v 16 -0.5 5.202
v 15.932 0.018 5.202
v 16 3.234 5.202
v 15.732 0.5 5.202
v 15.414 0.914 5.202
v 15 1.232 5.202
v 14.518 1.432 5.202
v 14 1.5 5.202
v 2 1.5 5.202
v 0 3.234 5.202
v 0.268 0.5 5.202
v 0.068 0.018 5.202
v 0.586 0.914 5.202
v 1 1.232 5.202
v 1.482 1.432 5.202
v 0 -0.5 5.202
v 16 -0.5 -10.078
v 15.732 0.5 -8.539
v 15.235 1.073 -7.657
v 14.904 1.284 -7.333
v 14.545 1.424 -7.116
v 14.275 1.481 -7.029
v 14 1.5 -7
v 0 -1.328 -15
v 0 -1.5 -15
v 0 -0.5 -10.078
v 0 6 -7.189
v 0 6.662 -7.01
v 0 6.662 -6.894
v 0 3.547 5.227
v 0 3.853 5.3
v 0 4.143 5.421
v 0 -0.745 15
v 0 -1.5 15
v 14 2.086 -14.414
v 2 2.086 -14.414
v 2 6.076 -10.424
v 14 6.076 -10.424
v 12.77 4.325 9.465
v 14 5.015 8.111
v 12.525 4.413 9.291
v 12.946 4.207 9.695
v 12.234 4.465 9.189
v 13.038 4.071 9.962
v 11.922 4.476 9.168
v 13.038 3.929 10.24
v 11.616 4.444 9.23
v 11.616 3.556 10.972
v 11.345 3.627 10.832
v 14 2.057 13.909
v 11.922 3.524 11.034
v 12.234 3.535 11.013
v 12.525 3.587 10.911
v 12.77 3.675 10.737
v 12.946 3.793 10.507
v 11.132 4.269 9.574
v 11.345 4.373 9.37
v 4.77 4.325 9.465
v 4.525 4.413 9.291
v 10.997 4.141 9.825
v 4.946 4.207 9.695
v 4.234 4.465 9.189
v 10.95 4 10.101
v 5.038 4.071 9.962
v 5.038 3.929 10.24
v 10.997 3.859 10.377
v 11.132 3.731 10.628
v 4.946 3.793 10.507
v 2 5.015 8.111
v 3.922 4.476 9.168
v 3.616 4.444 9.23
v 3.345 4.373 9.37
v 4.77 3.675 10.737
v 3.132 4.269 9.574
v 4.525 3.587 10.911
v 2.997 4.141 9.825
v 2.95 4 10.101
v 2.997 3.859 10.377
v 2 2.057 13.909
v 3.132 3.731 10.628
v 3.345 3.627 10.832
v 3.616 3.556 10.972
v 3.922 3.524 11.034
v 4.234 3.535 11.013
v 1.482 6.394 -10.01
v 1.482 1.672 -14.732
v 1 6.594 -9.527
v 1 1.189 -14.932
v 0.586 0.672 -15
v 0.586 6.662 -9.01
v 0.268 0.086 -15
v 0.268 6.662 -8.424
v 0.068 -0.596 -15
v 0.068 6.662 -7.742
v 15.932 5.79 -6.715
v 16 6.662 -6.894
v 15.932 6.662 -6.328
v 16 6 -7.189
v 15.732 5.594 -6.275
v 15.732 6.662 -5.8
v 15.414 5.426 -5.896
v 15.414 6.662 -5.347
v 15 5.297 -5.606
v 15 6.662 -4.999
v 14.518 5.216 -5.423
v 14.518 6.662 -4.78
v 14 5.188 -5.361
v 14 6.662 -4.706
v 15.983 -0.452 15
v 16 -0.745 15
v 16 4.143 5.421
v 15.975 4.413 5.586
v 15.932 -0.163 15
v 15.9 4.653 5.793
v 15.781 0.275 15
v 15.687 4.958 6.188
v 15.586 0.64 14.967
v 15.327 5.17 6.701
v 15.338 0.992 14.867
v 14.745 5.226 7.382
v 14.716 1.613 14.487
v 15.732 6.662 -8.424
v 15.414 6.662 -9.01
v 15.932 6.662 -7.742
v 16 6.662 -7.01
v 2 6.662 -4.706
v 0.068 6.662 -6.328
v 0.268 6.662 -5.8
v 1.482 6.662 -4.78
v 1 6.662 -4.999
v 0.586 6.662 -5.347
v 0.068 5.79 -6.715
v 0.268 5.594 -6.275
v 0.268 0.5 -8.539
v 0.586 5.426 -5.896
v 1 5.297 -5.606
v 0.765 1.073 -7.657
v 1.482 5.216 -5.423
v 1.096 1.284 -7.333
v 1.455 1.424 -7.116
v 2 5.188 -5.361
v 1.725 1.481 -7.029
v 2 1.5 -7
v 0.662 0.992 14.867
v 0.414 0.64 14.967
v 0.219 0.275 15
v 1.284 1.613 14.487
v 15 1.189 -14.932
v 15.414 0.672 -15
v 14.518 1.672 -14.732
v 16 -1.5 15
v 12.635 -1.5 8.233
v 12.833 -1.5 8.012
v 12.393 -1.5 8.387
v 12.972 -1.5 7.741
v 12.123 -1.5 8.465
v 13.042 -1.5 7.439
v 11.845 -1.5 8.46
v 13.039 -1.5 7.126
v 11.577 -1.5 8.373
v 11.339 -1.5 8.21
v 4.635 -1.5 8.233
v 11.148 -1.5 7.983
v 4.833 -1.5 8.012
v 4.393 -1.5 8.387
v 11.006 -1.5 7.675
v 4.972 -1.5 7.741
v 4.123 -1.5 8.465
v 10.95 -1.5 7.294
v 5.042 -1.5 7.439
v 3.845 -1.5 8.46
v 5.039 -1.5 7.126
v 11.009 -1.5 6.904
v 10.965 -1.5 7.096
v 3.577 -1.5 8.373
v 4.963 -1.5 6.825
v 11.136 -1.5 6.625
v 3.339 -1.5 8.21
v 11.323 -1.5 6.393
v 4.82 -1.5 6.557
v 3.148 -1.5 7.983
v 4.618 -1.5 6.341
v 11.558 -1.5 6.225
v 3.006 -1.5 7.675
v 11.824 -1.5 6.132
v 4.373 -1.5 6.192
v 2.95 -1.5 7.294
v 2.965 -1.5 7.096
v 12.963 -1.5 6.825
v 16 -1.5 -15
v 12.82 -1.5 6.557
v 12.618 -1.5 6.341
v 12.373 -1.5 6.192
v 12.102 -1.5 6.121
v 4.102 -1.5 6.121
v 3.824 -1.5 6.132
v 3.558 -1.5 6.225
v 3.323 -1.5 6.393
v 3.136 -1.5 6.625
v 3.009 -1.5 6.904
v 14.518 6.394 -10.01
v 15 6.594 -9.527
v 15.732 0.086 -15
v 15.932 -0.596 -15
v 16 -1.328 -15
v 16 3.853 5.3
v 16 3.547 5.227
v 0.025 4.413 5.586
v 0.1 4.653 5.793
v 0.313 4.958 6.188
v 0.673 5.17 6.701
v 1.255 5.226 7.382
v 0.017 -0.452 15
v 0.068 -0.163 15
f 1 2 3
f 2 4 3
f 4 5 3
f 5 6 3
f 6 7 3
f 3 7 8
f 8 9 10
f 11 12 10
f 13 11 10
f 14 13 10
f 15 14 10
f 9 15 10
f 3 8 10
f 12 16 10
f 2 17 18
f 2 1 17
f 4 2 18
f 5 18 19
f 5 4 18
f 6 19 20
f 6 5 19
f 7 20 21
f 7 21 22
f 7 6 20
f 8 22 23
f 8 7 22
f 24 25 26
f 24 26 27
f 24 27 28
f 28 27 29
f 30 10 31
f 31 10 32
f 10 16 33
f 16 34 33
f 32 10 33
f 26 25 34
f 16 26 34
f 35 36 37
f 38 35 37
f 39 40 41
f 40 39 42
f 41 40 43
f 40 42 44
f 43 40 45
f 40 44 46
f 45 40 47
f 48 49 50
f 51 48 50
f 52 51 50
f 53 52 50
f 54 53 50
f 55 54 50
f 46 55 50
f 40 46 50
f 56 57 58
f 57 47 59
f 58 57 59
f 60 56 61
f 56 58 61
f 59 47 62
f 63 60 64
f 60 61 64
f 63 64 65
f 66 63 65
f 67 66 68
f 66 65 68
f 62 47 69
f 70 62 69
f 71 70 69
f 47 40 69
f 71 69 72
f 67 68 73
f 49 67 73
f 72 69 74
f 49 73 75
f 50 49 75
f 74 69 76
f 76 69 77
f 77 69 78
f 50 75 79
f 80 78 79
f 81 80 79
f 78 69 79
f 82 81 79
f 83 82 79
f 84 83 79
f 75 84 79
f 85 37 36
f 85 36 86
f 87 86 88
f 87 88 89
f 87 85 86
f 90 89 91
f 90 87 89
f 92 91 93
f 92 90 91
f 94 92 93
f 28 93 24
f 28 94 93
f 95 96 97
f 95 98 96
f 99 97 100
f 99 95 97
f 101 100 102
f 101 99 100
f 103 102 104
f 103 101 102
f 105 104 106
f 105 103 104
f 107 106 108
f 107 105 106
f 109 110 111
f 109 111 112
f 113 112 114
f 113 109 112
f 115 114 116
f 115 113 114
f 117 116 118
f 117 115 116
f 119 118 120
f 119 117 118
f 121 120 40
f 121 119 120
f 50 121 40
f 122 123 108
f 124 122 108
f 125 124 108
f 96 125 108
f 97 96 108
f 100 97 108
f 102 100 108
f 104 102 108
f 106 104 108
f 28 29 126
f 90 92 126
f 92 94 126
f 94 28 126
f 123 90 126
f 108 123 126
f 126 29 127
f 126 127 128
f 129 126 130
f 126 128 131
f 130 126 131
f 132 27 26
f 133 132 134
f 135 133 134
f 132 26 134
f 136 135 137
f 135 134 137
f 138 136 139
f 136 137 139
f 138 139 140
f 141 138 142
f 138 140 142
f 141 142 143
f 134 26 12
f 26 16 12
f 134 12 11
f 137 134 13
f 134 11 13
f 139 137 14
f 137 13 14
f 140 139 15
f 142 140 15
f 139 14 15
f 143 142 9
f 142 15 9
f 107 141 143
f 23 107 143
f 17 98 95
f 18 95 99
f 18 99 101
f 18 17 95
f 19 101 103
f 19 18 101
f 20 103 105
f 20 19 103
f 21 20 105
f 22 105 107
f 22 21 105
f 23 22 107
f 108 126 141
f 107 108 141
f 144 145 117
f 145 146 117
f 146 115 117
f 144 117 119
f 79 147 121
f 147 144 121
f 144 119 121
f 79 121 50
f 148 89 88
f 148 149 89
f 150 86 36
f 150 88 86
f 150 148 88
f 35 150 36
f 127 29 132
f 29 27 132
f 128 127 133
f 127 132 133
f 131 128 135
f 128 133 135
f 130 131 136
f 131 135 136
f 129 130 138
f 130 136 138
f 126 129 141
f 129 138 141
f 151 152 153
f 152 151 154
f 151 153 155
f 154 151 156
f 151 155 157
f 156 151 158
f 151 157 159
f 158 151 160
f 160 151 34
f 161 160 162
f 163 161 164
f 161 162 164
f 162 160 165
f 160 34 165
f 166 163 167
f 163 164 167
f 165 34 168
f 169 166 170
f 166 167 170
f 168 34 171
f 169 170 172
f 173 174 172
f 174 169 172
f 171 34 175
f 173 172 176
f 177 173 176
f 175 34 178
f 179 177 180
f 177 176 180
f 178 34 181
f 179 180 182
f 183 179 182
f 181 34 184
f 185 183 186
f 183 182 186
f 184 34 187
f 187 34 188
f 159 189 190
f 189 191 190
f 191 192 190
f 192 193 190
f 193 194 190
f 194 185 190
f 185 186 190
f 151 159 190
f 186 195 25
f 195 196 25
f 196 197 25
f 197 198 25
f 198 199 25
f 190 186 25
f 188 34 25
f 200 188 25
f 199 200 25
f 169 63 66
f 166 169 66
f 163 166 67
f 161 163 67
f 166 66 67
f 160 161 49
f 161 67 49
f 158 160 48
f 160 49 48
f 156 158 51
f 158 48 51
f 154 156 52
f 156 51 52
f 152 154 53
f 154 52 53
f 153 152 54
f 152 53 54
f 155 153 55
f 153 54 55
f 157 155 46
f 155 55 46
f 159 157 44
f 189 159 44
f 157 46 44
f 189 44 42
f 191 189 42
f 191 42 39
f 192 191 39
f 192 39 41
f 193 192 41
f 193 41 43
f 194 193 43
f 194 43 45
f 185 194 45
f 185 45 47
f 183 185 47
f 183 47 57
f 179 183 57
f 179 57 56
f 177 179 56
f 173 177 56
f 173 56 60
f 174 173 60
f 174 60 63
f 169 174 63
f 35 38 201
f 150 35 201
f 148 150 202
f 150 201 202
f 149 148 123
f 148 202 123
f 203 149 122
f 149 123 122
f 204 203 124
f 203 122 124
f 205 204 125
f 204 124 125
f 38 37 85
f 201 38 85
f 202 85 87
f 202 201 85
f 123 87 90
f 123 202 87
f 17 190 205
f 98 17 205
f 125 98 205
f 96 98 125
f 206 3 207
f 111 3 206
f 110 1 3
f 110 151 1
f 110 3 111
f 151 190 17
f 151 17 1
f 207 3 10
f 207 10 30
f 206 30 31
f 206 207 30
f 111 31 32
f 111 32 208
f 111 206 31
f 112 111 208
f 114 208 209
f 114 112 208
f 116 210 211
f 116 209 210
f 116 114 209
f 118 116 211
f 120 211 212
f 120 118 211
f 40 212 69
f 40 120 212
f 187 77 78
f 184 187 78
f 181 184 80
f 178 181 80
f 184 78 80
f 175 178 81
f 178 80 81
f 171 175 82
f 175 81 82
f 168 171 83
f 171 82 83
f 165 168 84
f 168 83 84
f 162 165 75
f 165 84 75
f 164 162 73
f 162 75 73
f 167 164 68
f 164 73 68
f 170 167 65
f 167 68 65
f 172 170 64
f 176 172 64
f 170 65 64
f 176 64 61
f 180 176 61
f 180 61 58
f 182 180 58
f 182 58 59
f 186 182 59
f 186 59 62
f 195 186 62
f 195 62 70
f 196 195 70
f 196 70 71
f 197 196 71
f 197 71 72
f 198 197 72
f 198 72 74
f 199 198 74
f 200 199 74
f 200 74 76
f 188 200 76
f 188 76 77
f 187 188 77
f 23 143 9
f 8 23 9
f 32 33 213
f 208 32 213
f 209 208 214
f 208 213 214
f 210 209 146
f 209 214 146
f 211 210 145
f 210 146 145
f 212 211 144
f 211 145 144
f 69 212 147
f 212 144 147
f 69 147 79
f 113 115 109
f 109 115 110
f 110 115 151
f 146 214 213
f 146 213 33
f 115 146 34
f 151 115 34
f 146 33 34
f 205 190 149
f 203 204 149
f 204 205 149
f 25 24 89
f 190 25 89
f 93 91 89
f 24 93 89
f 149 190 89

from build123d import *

# Parameters (mm, degrees)
F1_DEPTH = 16
F2_R     = 1.05
F3_DEPTH = 7.7105812745
F4_R     = 2


with BuildPart() as f1:
    # F0 (on Right) → F1 (new body)
    with BuildSketch(Plane.YZ):
        Polygon((-1.5, -15), (1.5, -15), (1.5, -7), (1.5, -3), (1.5, 5.2020410289), (1.5, 15), (-1.5, 15), align=None)
        Polygon((6.5, 5.2020410289), (1.5, 15), (1.5, 5.2020410289), align=None)
        Polygon((1.5, -7), (1.5, -15), (6.6618086312, -9.8381913688), (6.6618086312, -4.7058628306), (5.187990124, -5.3608932782), align=None)
    extrude(amount=F1_DEPTH)

    # F2 (on face) → F3 (cut, up to face)
    with BuildSketch(Plane(origin=(0, 7.2631977094, 3.7064850602), x_dir=(-1, 0, 0), z_dir=(0, 0.8907235428, 0.4545454545))):
        with Locations((-12, 7.1790349606)):
            Circle(F2_R)
        with Locations((-4, 7.1790349606)):
            Circle(F2_R)
    extrude(amount=-F3_DEPTH, mode=Mode.SUBTRACT)

    # F4
    f4_edges = [f1.edges().sort_by_distance(p)[0] for p in [
        (16, 1.5, -0.898979),
        (0, 1.5, -0.898979),
        (16, 4, 10.101021),
        (0, 4, 10.101021),
        (8, 6.5, 5.202041),
        (8, 6.661809, -9.838191),
        (16, 4.080904, -12.419096),
        (0, 4.080904, -12.419096),
        (16, 4.080904, -5.852931),
        (0, 4.080904, -5.852931),
        (8, 1.5, 15),
        (8, 1.5, -15),
    ]]
    fillet(f4_edges, radius=F4_R)


solid = f1.part
